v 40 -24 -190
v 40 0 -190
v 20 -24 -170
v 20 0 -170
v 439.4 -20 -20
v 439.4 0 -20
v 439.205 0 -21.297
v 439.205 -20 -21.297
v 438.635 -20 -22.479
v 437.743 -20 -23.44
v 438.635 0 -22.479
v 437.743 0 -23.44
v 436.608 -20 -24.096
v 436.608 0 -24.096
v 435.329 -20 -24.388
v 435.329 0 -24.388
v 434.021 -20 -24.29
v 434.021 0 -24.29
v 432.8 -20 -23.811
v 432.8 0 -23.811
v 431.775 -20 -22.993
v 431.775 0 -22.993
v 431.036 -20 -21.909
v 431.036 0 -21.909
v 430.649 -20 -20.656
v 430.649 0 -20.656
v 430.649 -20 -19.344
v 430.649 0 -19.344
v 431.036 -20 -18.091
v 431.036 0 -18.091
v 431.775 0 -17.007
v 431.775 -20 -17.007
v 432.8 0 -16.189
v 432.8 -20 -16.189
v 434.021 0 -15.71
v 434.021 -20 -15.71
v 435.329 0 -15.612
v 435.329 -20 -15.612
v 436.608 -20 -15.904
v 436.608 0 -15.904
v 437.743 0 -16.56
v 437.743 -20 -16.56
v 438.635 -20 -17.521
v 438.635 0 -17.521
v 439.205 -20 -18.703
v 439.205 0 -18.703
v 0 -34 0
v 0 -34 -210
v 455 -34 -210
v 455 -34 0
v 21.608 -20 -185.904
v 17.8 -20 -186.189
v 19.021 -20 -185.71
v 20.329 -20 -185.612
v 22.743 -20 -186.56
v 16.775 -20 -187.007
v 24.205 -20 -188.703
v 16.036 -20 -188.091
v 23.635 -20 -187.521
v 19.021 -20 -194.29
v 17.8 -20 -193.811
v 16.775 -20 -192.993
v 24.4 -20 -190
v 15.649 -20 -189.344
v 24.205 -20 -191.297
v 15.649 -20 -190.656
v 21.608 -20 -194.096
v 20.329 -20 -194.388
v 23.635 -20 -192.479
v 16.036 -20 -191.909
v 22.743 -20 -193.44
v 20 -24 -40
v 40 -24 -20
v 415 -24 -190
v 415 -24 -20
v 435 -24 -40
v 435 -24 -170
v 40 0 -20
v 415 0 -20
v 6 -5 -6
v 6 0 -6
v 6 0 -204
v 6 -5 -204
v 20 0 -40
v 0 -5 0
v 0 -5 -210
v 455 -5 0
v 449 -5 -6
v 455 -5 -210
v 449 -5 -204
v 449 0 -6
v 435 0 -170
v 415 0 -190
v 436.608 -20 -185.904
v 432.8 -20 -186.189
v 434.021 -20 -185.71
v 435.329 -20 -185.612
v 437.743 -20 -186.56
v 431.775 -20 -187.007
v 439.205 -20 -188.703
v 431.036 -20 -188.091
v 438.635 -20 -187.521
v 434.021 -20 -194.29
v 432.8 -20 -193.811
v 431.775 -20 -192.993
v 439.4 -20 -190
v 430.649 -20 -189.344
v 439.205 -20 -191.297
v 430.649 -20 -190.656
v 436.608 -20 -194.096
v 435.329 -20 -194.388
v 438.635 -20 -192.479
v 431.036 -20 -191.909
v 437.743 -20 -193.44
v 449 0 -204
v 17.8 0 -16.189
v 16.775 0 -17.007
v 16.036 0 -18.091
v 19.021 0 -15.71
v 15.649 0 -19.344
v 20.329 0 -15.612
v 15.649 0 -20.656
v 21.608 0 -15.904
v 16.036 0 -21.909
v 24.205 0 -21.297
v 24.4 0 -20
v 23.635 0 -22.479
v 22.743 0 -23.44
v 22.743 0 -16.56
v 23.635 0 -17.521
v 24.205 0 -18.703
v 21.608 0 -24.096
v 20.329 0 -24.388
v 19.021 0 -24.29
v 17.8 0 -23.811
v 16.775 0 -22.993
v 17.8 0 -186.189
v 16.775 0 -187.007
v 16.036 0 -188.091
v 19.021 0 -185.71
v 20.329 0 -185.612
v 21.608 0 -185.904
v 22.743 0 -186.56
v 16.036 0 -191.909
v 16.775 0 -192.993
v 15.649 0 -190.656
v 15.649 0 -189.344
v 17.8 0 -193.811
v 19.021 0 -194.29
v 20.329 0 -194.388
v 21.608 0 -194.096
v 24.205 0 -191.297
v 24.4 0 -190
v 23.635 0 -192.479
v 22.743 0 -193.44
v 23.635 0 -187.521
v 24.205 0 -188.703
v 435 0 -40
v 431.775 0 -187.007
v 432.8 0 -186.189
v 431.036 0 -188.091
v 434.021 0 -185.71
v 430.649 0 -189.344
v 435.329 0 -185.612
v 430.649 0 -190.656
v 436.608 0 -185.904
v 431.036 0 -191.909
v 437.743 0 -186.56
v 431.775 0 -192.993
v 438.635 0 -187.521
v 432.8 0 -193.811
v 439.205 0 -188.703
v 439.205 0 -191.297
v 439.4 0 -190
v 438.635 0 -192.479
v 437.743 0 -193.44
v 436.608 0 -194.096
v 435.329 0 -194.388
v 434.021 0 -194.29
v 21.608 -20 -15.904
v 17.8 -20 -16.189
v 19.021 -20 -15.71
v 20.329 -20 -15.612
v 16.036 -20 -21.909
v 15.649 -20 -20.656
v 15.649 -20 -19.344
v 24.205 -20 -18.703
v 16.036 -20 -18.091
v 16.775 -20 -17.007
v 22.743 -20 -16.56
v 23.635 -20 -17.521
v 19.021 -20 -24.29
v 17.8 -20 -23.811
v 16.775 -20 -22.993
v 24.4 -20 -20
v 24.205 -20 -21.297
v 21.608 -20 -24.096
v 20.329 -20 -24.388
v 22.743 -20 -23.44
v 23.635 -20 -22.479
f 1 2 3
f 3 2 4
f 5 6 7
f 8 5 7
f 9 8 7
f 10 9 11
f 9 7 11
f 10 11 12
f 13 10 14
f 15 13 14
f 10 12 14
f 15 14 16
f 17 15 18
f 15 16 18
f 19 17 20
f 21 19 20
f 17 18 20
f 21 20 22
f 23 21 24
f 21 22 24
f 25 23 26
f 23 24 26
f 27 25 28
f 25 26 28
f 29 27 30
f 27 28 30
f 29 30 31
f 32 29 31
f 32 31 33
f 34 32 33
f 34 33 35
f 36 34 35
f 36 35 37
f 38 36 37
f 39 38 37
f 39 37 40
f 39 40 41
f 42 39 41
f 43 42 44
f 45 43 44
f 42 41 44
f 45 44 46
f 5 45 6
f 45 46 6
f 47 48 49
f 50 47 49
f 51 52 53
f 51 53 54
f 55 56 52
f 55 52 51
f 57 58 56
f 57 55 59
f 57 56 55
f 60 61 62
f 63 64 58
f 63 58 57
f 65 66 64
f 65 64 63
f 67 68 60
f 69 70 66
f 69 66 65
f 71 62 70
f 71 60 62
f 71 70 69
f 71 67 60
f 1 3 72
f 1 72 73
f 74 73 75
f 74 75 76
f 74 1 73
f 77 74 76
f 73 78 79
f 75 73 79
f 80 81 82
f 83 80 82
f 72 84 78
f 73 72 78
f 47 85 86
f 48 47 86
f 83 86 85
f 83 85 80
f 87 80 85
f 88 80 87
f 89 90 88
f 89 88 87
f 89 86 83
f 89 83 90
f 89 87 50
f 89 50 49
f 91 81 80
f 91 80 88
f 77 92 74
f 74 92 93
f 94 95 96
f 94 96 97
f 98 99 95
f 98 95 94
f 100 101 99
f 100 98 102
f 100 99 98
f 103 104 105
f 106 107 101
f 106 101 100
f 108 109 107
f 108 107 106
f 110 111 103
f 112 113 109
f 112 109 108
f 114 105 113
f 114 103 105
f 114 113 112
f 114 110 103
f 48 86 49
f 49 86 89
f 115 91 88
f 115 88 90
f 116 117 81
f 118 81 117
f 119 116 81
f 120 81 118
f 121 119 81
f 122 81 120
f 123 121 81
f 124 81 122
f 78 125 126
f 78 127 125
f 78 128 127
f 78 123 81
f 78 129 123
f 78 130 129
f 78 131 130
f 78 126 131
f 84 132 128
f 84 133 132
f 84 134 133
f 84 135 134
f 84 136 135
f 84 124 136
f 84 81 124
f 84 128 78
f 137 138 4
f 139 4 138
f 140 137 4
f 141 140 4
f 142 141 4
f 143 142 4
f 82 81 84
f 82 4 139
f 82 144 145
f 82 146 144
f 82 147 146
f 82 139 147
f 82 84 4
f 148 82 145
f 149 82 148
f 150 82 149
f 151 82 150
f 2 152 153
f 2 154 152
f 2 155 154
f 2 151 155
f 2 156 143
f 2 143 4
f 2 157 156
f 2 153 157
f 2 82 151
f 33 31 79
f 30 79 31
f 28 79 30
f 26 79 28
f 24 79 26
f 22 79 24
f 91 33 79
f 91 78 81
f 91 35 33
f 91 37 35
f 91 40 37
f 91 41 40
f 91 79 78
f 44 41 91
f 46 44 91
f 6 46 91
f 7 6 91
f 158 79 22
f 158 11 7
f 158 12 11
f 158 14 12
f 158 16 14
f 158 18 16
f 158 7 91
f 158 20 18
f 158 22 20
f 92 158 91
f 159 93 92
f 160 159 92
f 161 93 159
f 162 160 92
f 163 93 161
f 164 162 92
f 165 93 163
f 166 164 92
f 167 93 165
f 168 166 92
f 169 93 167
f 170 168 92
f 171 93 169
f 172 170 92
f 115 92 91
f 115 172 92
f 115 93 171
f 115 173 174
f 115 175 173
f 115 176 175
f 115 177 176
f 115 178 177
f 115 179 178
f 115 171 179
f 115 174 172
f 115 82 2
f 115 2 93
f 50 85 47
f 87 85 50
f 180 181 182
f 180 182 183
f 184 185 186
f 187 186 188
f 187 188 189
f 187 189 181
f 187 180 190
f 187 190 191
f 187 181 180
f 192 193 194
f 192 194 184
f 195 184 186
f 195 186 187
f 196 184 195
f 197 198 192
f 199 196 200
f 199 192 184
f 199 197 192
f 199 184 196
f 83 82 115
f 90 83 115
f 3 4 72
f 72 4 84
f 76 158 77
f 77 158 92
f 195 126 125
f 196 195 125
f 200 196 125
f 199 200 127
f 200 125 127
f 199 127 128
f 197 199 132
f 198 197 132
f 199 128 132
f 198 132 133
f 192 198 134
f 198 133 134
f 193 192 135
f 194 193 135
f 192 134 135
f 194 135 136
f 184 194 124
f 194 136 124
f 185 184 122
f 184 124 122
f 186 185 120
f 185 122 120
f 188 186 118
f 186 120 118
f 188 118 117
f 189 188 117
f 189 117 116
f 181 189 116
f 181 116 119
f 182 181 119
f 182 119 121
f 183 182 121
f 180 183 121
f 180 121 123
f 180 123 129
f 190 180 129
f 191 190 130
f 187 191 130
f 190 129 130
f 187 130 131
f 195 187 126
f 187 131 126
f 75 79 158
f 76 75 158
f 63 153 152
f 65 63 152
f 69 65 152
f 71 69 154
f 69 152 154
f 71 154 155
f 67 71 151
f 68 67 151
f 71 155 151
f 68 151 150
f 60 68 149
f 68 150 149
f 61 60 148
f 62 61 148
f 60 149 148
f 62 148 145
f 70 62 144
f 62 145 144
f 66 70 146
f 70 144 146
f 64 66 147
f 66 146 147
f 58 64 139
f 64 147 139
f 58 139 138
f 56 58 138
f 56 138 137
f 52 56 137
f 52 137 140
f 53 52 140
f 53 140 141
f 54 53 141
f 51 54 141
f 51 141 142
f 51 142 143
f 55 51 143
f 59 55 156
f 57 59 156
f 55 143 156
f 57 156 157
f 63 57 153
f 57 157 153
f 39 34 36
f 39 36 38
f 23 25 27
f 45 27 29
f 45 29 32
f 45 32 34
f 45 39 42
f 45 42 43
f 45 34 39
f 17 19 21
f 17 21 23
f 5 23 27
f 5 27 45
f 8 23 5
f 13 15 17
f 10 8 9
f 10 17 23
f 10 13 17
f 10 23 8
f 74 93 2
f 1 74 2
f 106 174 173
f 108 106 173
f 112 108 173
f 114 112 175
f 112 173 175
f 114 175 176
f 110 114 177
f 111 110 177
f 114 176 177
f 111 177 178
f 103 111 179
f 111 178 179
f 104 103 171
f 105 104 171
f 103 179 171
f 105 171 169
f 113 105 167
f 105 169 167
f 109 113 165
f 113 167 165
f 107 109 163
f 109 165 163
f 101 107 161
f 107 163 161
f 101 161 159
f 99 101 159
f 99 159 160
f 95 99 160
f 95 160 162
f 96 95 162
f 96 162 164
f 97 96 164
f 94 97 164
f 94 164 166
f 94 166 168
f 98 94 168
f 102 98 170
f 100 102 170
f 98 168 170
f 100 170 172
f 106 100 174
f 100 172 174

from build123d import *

# Parameters (mm, degrees)
SLABSKETCH_W            = 455
SLABSKETCH_H            = 210
SLAB_DEPTH              = 34
CUT_DEPTH               = 24
DIVOTSKETCH_OUTSIDE_W   = 557.456
DIVOTSKETCH_OUTSIDE_H   = 312.456
DIVOTSKETCH_OUTSIDE_W_2 = 443
DIVOTSKETCH_OUTSIDE_H_2 = 198
DIVOT_DEPTH             = 5
PILOTHOLESSKETCH_R      = 4.4
PILOTHOLES_DEPTH        = 20


with BuildPart() as part:
    # slabSketch → slab (new body)
    with BuildSketch(Plane(origin=(0, 0, 0), x_dir=(1, 0, 0), z_dir=(0, 1, 0))):
        with Locations((227.5, 105)):
            Rectangle(SLABSKETCH_W, SLABSKETCH_H)
    extrude(amount=-SLAB_DEPTH)

    # cutSketch → cut (cut)
    with BuildSketch(Plane(origin=(0, 0, 0), x_dir=(1, 0, 0), z_dir=(0, 1, 0))):
        Polygon((40, 190), (20, 170), (20, 40), (40, 20), (415, 20), (435, 40), (435, 170), (415, 190), align=None)
    extrude(amount=-CUT_DEPTH, mode=Mode.SUBTRACT)

    # divotSketch outside → divot (cut)
    with BuildSketch(Plane(origin=(0, 0, 0), x_dir=(1, 0, 0), z_dir=(0, 1, 0))):
        with Locations((227.5, 105)):
            Rectangle(DIVOTSKETCH_OUTSIDE_W, DIVOTSKETCH_OUTSIDE_H)
        with Locations((227.5, 105)):
            Rectangle(DIVOTSKETCH_OUTSIDE_W_2, DIVOTSKETCH_OUTSIDE_H_2, mode=Mode.SUBTRACT)
    extrude(amount=-DIVOT_DEPTH, mode=Mode.SUBTRACT)

    # pilotholesSketch → pilotholes (cut)
    with BuildSketch(Plane(origin=(0, 0, 0), x_dir=(1, 0, 0), z_dir=(0, 1, 0))):
        with Locations((20, 190)):
            Circle(PILOTHOLESSKETCH_R)
        with Locations((435, 190)):
            Circle(PILOTHOLESSKETCH_R)
        with Locations((435, 20)):
            Circle(PILOTHOLESSKETCH_R)
        with Locations((20, 20)):
            Circle(PILOTHOLESSKETCH_R)
    extrude(amount=-PILOTHOLES_DEPTH, mode=Mode.SUBTRACT)


solid = part.part
